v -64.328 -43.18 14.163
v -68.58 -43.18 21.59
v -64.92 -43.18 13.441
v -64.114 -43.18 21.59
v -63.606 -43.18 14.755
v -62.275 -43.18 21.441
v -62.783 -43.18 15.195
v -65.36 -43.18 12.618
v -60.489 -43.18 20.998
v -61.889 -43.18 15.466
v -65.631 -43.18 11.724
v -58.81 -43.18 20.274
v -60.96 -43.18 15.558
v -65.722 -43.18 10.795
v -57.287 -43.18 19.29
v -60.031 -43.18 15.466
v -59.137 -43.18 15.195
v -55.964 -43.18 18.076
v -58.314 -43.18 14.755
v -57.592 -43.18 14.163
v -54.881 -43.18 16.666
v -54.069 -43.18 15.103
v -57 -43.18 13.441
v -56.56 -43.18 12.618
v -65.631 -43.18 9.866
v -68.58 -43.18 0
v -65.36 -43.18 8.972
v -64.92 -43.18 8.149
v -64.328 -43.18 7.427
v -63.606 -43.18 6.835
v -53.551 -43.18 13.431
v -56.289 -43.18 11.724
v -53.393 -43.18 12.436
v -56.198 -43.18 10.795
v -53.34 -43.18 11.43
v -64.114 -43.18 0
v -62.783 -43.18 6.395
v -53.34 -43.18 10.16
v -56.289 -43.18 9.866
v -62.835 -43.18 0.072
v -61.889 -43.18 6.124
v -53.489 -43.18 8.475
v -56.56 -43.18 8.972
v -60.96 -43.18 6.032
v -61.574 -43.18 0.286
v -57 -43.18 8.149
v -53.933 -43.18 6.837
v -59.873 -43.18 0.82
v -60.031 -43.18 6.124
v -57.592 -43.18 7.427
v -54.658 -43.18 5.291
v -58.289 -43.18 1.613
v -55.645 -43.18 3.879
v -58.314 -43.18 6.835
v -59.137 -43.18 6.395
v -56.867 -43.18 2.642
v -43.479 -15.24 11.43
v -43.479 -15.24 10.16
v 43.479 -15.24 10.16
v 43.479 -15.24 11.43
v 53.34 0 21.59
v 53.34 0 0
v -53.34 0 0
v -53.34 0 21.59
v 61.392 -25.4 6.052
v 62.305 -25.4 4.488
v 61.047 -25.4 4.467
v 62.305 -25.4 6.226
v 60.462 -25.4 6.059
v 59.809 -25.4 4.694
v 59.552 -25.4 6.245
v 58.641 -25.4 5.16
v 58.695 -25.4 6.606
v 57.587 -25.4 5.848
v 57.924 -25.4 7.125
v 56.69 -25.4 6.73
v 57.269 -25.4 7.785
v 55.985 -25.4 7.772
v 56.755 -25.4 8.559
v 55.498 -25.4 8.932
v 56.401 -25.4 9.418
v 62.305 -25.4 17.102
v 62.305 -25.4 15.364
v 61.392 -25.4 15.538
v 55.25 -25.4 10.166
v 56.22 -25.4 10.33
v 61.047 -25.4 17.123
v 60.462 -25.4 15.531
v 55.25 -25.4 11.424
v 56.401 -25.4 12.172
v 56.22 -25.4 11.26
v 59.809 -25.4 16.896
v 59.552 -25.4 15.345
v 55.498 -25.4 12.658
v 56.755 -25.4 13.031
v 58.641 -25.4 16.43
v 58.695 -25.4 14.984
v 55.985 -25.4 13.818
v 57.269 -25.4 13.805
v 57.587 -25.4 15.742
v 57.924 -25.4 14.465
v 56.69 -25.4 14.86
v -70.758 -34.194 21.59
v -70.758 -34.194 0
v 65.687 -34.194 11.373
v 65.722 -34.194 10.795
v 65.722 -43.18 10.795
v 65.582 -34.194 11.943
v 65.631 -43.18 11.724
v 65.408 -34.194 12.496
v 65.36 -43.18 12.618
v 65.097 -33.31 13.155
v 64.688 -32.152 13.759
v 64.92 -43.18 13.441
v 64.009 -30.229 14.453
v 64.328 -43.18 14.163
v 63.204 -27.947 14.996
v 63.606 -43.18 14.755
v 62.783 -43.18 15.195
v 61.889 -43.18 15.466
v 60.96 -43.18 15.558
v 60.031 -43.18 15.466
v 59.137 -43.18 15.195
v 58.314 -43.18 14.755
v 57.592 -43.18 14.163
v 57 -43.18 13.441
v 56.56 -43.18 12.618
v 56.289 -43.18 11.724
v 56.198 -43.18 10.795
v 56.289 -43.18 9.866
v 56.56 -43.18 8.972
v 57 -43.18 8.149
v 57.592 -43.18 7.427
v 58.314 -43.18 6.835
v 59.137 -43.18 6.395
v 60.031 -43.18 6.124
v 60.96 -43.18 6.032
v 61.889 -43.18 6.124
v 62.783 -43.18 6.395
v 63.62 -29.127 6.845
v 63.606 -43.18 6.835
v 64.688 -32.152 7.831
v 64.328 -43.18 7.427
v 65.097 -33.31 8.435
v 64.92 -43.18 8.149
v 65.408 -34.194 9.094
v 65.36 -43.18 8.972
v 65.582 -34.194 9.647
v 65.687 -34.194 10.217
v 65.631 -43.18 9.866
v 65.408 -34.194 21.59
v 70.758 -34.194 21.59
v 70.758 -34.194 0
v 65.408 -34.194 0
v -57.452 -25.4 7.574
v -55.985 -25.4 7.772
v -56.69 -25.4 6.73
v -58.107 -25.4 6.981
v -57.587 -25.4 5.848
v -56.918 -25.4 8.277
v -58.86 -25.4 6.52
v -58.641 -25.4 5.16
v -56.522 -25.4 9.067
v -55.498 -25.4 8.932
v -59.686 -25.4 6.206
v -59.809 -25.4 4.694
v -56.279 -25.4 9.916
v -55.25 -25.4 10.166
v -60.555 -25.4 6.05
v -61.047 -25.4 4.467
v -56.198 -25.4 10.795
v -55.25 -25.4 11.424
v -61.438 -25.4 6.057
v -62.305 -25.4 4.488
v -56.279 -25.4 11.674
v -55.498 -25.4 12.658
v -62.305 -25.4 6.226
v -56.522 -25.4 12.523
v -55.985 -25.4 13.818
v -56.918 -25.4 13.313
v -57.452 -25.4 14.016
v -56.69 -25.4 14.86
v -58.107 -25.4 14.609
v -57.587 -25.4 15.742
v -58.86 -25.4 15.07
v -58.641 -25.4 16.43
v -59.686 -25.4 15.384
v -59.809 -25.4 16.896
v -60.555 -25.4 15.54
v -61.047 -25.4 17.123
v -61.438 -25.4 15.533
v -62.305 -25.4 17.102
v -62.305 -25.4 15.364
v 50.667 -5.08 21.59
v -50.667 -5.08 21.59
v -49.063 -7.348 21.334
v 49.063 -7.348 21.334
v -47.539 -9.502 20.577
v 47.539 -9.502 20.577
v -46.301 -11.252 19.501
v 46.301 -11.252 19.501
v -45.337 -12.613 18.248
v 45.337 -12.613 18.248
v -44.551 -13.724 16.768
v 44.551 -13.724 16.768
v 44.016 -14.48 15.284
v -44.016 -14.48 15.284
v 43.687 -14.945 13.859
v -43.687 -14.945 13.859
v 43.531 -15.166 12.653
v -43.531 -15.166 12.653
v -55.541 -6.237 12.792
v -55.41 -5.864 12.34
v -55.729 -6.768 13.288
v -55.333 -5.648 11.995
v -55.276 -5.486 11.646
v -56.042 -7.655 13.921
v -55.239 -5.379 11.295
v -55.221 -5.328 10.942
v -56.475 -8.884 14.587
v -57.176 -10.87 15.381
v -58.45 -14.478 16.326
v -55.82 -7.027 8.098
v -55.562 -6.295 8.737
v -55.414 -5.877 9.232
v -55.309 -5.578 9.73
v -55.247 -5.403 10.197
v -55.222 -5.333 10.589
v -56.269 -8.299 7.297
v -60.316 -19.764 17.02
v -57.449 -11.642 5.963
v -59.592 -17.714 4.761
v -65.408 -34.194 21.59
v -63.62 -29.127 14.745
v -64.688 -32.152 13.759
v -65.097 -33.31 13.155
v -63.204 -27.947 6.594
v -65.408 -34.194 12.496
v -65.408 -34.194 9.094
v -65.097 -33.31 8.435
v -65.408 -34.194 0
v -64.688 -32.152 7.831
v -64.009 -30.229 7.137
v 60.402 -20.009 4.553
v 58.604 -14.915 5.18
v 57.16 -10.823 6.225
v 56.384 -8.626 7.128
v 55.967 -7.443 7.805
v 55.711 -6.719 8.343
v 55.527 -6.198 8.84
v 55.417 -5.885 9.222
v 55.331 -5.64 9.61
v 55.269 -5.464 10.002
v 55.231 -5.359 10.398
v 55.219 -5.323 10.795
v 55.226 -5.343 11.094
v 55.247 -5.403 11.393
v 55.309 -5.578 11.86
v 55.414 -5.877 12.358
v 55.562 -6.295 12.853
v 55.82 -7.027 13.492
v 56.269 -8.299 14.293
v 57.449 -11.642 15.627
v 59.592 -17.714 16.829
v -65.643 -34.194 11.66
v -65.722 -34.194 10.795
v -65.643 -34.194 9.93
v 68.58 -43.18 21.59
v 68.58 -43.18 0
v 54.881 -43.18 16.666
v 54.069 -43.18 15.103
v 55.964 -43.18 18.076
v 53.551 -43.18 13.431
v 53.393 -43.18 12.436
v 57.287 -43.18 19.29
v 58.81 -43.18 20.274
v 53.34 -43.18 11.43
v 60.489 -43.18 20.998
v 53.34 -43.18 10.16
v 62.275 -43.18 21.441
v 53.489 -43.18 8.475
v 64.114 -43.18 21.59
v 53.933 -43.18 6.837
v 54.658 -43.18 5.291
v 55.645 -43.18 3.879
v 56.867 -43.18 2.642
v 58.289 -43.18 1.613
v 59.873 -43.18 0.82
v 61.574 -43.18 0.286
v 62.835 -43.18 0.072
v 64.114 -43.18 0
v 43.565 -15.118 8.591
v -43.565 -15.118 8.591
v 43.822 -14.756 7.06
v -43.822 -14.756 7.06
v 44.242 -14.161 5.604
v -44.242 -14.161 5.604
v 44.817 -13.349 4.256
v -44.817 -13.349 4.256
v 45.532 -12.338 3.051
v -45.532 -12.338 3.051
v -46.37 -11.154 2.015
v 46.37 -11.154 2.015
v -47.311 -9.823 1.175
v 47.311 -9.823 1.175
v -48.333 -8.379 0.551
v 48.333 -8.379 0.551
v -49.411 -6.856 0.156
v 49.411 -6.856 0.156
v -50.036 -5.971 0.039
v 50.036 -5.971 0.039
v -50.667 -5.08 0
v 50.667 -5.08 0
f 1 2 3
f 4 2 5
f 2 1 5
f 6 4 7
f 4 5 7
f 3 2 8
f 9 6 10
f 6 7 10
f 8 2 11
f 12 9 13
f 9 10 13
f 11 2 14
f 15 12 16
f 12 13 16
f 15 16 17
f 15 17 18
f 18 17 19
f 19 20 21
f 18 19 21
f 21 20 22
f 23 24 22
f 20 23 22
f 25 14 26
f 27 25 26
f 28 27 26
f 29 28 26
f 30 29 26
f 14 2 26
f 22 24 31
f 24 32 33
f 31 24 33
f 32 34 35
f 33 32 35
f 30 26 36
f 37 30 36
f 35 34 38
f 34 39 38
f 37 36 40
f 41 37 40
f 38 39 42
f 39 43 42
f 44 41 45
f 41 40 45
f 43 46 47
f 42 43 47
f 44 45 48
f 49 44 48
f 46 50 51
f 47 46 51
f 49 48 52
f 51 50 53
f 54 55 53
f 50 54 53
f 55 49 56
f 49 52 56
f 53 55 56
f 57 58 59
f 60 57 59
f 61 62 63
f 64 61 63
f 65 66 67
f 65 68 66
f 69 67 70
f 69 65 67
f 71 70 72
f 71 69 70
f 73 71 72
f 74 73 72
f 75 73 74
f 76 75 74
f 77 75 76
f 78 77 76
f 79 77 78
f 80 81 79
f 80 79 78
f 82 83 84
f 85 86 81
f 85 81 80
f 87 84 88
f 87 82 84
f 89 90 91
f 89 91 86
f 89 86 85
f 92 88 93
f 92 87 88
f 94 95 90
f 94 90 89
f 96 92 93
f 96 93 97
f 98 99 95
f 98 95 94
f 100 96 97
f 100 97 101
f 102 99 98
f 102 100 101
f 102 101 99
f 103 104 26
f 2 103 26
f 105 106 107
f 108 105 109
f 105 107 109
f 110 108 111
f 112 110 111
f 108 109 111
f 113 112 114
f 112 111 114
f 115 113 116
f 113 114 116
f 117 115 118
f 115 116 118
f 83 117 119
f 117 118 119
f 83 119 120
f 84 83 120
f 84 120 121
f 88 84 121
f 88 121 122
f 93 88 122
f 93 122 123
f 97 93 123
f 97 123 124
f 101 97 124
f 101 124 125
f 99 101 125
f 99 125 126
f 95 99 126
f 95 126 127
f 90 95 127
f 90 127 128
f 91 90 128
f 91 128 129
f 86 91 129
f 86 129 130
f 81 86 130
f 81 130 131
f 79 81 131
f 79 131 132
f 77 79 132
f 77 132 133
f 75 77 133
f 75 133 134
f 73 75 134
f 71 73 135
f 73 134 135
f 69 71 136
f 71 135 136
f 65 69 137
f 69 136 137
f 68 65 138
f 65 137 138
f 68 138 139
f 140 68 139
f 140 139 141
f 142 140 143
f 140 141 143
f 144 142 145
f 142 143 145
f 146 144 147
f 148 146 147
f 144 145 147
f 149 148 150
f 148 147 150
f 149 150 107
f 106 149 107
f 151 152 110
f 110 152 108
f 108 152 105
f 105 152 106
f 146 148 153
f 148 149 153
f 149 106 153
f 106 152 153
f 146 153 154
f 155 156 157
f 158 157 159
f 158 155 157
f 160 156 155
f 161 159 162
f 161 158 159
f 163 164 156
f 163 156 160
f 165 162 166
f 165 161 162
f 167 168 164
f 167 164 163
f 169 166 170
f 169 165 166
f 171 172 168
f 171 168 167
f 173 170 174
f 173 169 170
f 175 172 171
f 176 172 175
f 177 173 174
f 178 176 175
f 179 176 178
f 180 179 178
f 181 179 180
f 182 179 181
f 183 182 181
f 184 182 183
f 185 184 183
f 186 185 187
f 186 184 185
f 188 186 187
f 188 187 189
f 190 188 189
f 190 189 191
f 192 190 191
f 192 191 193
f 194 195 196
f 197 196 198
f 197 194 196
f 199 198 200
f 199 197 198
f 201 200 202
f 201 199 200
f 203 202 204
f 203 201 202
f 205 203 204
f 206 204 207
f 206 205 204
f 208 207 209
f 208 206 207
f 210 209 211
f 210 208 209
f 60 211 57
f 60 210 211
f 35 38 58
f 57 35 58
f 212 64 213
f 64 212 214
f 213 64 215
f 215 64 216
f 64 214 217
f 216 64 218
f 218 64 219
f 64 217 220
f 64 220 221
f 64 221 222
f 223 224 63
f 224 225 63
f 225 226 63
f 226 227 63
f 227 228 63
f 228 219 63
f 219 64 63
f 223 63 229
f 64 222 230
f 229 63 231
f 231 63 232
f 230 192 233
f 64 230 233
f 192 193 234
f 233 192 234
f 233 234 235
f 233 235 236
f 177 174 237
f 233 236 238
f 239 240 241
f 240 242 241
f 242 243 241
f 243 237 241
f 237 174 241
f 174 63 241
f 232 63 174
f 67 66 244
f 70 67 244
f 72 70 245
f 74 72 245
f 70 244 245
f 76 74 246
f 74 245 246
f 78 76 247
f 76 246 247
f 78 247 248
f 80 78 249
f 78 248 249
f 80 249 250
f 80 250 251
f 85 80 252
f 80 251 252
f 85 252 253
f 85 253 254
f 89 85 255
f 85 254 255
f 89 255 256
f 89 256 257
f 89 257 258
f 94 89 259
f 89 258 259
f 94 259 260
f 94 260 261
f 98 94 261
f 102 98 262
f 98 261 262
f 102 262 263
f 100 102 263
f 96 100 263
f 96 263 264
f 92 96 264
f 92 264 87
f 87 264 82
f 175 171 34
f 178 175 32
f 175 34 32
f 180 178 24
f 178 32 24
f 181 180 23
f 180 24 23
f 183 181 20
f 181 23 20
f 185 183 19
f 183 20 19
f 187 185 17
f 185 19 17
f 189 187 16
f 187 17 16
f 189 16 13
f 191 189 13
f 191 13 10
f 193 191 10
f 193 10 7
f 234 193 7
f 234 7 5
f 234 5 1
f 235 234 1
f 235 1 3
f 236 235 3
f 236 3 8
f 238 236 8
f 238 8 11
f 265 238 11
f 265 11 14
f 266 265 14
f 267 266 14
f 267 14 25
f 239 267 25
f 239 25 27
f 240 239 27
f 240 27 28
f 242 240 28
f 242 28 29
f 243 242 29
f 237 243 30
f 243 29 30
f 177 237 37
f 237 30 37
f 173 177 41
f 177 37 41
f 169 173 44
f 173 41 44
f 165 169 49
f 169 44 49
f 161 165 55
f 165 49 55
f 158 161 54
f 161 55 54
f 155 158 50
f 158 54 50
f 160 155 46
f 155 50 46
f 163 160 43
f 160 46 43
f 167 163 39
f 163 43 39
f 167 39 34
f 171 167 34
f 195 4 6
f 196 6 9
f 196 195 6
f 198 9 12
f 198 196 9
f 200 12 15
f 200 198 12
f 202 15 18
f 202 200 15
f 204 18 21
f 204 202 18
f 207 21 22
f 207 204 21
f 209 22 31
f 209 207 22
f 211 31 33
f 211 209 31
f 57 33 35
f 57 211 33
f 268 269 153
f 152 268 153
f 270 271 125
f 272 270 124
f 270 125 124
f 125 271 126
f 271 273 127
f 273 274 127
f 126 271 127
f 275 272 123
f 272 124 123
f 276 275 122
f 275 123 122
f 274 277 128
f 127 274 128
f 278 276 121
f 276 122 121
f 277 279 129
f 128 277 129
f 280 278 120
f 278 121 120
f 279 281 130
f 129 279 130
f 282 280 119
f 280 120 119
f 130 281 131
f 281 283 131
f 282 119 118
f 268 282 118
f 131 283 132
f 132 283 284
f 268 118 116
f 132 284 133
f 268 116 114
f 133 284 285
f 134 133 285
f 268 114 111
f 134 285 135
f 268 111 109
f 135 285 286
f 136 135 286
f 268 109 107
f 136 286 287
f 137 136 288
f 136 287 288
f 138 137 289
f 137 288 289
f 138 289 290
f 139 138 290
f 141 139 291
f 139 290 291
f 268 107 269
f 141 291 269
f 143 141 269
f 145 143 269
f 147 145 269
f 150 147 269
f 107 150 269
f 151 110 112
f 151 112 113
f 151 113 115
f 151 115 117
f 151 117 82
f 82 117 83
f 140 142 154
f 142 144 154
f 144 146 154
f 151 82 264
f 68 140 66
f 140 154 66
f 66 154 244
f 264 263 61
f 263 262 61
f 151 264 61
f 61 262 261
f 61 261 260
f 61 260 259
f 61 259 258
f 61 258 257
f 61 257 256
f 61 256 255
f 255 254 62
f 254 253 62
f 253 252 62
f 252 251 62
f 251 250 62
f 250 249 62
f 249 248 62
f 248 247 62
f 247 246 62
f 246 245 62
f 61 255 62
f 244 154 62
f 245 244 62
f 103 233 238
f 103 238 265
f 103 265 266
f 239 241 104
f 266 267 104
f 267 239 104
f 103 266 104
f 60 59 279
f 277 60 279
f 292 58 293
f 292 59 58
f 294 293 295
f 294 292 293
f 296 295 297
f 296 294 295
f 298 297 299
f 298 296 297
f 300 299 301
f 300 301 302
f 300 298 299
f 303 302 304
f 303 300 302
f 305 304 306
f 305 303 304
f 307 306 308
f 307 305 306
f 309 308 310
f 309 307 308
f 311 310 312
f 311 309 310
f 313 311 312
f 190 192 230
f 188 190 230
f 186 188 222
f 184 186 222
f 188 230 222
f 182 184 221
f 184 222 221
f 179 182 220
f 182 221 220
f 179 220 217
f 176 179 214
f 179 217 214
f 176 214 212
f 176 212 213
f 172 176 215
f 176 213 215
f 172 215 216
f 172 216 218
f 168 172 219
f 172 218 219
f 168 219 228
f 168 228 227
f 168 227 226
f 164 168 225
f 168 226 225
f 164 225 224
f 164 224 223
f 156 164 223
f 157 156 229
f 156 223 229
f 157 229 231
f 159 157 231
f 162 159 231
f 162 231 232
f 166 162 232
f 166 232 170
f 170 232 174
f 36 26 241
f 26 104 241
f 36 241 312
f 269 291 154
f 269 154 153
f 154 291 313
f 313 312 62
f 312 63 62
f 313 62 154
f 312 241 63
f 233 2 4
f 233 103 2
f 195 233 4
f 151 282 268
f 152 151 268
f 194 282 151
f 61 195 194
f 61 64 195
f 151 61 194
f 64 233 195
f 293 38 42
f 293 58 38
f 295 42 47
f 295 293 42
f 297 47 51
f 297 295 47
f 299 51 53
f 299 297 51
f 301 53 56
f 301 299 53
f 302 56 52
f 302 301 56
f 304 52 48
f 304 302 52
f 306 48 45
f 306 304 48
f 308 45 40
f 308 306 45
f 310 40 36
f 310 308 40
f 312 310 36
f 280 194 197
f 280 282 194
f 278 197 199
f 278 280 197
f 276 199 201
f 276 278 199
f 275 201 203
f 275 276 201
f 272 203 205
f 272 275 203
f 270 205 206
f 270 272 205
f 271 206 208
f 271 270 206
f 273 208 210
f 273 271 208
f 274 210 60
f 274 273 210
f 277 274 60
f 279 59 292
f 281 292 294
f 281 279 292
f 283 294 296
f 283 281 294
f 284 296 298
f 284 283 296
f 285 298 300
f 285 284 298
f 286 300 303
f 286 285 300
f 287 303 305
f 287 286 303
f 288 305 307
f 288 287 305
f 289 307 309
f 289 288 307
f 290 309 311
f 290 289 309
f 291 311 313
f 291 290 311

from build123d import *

# Parameters (mm, degrees)
F1_DEPTH = 21.59
F2_R     = 4.7625
F3_DEPTH = 25.4
F4_R     = 6.35
F5_DEPTH = 25.4
F6_R     = 10.16


with BuildPart() as f1:
    # F0 (on Top) → F1 (new body)
    with BuildSketch(Plane.XY):
        Polygon((53.34, 0), (0, 0), (-53.34, 0), (-65.4083, -34.193517), (-70.758128, -34.193517), (-68.58, -43.18), (-53.34, -43.18), (-43.478824, -15.24), (0, -15.24), (43.478824, -15.24), (53.34, -43.18), (68.58, -43.18), (70.758128, -34.193517), (65.4083, -34.193517), align=None)
    extrude(amount=F1_DEPTH)

    # F2 (on face) → F3 (cut)
    with BuildSketch(Plane.XZ.offset(43.18)):
        with Locations((-60.96, 10.795)):
            Circle(F2_R)
        with Locations((60.96, 10.795)):
            Circle(F2_R)
    extrude(amount=-F3_DEPTH, mode=Mode.SUBTRACT)

    # F4 (on face) → F5 (cut)
    with BuildSketch(Plane(origin=(0, 0, 0), x_dir=(-1, 0, 0), z_dir=(0, 1, 0))):
        with Locations((-61.568875, 10.795)):
            Circle(F4_R)
        with Locations((61.568875, 10.795)):
            Circle(F4_R)
    extrude(amount=-F5_DEPTH, mode=Mode.SUBTRACT)

    # F6
    f6_edges = [f1.edges().sort_by_distance(p)[0] for p in [
        (0, -15.24, 0),
        (48.409412, -29.21, 0),
        (-48.409412, -29.21, 0),
        (48.409412, -29.21, 21.59),
        (0, -15.24, 21.59),
        (-48.409412, -29.21, 21.59),
    ]]
    fillet(f6_edges, radius=F6_R)


solid = f1.part
